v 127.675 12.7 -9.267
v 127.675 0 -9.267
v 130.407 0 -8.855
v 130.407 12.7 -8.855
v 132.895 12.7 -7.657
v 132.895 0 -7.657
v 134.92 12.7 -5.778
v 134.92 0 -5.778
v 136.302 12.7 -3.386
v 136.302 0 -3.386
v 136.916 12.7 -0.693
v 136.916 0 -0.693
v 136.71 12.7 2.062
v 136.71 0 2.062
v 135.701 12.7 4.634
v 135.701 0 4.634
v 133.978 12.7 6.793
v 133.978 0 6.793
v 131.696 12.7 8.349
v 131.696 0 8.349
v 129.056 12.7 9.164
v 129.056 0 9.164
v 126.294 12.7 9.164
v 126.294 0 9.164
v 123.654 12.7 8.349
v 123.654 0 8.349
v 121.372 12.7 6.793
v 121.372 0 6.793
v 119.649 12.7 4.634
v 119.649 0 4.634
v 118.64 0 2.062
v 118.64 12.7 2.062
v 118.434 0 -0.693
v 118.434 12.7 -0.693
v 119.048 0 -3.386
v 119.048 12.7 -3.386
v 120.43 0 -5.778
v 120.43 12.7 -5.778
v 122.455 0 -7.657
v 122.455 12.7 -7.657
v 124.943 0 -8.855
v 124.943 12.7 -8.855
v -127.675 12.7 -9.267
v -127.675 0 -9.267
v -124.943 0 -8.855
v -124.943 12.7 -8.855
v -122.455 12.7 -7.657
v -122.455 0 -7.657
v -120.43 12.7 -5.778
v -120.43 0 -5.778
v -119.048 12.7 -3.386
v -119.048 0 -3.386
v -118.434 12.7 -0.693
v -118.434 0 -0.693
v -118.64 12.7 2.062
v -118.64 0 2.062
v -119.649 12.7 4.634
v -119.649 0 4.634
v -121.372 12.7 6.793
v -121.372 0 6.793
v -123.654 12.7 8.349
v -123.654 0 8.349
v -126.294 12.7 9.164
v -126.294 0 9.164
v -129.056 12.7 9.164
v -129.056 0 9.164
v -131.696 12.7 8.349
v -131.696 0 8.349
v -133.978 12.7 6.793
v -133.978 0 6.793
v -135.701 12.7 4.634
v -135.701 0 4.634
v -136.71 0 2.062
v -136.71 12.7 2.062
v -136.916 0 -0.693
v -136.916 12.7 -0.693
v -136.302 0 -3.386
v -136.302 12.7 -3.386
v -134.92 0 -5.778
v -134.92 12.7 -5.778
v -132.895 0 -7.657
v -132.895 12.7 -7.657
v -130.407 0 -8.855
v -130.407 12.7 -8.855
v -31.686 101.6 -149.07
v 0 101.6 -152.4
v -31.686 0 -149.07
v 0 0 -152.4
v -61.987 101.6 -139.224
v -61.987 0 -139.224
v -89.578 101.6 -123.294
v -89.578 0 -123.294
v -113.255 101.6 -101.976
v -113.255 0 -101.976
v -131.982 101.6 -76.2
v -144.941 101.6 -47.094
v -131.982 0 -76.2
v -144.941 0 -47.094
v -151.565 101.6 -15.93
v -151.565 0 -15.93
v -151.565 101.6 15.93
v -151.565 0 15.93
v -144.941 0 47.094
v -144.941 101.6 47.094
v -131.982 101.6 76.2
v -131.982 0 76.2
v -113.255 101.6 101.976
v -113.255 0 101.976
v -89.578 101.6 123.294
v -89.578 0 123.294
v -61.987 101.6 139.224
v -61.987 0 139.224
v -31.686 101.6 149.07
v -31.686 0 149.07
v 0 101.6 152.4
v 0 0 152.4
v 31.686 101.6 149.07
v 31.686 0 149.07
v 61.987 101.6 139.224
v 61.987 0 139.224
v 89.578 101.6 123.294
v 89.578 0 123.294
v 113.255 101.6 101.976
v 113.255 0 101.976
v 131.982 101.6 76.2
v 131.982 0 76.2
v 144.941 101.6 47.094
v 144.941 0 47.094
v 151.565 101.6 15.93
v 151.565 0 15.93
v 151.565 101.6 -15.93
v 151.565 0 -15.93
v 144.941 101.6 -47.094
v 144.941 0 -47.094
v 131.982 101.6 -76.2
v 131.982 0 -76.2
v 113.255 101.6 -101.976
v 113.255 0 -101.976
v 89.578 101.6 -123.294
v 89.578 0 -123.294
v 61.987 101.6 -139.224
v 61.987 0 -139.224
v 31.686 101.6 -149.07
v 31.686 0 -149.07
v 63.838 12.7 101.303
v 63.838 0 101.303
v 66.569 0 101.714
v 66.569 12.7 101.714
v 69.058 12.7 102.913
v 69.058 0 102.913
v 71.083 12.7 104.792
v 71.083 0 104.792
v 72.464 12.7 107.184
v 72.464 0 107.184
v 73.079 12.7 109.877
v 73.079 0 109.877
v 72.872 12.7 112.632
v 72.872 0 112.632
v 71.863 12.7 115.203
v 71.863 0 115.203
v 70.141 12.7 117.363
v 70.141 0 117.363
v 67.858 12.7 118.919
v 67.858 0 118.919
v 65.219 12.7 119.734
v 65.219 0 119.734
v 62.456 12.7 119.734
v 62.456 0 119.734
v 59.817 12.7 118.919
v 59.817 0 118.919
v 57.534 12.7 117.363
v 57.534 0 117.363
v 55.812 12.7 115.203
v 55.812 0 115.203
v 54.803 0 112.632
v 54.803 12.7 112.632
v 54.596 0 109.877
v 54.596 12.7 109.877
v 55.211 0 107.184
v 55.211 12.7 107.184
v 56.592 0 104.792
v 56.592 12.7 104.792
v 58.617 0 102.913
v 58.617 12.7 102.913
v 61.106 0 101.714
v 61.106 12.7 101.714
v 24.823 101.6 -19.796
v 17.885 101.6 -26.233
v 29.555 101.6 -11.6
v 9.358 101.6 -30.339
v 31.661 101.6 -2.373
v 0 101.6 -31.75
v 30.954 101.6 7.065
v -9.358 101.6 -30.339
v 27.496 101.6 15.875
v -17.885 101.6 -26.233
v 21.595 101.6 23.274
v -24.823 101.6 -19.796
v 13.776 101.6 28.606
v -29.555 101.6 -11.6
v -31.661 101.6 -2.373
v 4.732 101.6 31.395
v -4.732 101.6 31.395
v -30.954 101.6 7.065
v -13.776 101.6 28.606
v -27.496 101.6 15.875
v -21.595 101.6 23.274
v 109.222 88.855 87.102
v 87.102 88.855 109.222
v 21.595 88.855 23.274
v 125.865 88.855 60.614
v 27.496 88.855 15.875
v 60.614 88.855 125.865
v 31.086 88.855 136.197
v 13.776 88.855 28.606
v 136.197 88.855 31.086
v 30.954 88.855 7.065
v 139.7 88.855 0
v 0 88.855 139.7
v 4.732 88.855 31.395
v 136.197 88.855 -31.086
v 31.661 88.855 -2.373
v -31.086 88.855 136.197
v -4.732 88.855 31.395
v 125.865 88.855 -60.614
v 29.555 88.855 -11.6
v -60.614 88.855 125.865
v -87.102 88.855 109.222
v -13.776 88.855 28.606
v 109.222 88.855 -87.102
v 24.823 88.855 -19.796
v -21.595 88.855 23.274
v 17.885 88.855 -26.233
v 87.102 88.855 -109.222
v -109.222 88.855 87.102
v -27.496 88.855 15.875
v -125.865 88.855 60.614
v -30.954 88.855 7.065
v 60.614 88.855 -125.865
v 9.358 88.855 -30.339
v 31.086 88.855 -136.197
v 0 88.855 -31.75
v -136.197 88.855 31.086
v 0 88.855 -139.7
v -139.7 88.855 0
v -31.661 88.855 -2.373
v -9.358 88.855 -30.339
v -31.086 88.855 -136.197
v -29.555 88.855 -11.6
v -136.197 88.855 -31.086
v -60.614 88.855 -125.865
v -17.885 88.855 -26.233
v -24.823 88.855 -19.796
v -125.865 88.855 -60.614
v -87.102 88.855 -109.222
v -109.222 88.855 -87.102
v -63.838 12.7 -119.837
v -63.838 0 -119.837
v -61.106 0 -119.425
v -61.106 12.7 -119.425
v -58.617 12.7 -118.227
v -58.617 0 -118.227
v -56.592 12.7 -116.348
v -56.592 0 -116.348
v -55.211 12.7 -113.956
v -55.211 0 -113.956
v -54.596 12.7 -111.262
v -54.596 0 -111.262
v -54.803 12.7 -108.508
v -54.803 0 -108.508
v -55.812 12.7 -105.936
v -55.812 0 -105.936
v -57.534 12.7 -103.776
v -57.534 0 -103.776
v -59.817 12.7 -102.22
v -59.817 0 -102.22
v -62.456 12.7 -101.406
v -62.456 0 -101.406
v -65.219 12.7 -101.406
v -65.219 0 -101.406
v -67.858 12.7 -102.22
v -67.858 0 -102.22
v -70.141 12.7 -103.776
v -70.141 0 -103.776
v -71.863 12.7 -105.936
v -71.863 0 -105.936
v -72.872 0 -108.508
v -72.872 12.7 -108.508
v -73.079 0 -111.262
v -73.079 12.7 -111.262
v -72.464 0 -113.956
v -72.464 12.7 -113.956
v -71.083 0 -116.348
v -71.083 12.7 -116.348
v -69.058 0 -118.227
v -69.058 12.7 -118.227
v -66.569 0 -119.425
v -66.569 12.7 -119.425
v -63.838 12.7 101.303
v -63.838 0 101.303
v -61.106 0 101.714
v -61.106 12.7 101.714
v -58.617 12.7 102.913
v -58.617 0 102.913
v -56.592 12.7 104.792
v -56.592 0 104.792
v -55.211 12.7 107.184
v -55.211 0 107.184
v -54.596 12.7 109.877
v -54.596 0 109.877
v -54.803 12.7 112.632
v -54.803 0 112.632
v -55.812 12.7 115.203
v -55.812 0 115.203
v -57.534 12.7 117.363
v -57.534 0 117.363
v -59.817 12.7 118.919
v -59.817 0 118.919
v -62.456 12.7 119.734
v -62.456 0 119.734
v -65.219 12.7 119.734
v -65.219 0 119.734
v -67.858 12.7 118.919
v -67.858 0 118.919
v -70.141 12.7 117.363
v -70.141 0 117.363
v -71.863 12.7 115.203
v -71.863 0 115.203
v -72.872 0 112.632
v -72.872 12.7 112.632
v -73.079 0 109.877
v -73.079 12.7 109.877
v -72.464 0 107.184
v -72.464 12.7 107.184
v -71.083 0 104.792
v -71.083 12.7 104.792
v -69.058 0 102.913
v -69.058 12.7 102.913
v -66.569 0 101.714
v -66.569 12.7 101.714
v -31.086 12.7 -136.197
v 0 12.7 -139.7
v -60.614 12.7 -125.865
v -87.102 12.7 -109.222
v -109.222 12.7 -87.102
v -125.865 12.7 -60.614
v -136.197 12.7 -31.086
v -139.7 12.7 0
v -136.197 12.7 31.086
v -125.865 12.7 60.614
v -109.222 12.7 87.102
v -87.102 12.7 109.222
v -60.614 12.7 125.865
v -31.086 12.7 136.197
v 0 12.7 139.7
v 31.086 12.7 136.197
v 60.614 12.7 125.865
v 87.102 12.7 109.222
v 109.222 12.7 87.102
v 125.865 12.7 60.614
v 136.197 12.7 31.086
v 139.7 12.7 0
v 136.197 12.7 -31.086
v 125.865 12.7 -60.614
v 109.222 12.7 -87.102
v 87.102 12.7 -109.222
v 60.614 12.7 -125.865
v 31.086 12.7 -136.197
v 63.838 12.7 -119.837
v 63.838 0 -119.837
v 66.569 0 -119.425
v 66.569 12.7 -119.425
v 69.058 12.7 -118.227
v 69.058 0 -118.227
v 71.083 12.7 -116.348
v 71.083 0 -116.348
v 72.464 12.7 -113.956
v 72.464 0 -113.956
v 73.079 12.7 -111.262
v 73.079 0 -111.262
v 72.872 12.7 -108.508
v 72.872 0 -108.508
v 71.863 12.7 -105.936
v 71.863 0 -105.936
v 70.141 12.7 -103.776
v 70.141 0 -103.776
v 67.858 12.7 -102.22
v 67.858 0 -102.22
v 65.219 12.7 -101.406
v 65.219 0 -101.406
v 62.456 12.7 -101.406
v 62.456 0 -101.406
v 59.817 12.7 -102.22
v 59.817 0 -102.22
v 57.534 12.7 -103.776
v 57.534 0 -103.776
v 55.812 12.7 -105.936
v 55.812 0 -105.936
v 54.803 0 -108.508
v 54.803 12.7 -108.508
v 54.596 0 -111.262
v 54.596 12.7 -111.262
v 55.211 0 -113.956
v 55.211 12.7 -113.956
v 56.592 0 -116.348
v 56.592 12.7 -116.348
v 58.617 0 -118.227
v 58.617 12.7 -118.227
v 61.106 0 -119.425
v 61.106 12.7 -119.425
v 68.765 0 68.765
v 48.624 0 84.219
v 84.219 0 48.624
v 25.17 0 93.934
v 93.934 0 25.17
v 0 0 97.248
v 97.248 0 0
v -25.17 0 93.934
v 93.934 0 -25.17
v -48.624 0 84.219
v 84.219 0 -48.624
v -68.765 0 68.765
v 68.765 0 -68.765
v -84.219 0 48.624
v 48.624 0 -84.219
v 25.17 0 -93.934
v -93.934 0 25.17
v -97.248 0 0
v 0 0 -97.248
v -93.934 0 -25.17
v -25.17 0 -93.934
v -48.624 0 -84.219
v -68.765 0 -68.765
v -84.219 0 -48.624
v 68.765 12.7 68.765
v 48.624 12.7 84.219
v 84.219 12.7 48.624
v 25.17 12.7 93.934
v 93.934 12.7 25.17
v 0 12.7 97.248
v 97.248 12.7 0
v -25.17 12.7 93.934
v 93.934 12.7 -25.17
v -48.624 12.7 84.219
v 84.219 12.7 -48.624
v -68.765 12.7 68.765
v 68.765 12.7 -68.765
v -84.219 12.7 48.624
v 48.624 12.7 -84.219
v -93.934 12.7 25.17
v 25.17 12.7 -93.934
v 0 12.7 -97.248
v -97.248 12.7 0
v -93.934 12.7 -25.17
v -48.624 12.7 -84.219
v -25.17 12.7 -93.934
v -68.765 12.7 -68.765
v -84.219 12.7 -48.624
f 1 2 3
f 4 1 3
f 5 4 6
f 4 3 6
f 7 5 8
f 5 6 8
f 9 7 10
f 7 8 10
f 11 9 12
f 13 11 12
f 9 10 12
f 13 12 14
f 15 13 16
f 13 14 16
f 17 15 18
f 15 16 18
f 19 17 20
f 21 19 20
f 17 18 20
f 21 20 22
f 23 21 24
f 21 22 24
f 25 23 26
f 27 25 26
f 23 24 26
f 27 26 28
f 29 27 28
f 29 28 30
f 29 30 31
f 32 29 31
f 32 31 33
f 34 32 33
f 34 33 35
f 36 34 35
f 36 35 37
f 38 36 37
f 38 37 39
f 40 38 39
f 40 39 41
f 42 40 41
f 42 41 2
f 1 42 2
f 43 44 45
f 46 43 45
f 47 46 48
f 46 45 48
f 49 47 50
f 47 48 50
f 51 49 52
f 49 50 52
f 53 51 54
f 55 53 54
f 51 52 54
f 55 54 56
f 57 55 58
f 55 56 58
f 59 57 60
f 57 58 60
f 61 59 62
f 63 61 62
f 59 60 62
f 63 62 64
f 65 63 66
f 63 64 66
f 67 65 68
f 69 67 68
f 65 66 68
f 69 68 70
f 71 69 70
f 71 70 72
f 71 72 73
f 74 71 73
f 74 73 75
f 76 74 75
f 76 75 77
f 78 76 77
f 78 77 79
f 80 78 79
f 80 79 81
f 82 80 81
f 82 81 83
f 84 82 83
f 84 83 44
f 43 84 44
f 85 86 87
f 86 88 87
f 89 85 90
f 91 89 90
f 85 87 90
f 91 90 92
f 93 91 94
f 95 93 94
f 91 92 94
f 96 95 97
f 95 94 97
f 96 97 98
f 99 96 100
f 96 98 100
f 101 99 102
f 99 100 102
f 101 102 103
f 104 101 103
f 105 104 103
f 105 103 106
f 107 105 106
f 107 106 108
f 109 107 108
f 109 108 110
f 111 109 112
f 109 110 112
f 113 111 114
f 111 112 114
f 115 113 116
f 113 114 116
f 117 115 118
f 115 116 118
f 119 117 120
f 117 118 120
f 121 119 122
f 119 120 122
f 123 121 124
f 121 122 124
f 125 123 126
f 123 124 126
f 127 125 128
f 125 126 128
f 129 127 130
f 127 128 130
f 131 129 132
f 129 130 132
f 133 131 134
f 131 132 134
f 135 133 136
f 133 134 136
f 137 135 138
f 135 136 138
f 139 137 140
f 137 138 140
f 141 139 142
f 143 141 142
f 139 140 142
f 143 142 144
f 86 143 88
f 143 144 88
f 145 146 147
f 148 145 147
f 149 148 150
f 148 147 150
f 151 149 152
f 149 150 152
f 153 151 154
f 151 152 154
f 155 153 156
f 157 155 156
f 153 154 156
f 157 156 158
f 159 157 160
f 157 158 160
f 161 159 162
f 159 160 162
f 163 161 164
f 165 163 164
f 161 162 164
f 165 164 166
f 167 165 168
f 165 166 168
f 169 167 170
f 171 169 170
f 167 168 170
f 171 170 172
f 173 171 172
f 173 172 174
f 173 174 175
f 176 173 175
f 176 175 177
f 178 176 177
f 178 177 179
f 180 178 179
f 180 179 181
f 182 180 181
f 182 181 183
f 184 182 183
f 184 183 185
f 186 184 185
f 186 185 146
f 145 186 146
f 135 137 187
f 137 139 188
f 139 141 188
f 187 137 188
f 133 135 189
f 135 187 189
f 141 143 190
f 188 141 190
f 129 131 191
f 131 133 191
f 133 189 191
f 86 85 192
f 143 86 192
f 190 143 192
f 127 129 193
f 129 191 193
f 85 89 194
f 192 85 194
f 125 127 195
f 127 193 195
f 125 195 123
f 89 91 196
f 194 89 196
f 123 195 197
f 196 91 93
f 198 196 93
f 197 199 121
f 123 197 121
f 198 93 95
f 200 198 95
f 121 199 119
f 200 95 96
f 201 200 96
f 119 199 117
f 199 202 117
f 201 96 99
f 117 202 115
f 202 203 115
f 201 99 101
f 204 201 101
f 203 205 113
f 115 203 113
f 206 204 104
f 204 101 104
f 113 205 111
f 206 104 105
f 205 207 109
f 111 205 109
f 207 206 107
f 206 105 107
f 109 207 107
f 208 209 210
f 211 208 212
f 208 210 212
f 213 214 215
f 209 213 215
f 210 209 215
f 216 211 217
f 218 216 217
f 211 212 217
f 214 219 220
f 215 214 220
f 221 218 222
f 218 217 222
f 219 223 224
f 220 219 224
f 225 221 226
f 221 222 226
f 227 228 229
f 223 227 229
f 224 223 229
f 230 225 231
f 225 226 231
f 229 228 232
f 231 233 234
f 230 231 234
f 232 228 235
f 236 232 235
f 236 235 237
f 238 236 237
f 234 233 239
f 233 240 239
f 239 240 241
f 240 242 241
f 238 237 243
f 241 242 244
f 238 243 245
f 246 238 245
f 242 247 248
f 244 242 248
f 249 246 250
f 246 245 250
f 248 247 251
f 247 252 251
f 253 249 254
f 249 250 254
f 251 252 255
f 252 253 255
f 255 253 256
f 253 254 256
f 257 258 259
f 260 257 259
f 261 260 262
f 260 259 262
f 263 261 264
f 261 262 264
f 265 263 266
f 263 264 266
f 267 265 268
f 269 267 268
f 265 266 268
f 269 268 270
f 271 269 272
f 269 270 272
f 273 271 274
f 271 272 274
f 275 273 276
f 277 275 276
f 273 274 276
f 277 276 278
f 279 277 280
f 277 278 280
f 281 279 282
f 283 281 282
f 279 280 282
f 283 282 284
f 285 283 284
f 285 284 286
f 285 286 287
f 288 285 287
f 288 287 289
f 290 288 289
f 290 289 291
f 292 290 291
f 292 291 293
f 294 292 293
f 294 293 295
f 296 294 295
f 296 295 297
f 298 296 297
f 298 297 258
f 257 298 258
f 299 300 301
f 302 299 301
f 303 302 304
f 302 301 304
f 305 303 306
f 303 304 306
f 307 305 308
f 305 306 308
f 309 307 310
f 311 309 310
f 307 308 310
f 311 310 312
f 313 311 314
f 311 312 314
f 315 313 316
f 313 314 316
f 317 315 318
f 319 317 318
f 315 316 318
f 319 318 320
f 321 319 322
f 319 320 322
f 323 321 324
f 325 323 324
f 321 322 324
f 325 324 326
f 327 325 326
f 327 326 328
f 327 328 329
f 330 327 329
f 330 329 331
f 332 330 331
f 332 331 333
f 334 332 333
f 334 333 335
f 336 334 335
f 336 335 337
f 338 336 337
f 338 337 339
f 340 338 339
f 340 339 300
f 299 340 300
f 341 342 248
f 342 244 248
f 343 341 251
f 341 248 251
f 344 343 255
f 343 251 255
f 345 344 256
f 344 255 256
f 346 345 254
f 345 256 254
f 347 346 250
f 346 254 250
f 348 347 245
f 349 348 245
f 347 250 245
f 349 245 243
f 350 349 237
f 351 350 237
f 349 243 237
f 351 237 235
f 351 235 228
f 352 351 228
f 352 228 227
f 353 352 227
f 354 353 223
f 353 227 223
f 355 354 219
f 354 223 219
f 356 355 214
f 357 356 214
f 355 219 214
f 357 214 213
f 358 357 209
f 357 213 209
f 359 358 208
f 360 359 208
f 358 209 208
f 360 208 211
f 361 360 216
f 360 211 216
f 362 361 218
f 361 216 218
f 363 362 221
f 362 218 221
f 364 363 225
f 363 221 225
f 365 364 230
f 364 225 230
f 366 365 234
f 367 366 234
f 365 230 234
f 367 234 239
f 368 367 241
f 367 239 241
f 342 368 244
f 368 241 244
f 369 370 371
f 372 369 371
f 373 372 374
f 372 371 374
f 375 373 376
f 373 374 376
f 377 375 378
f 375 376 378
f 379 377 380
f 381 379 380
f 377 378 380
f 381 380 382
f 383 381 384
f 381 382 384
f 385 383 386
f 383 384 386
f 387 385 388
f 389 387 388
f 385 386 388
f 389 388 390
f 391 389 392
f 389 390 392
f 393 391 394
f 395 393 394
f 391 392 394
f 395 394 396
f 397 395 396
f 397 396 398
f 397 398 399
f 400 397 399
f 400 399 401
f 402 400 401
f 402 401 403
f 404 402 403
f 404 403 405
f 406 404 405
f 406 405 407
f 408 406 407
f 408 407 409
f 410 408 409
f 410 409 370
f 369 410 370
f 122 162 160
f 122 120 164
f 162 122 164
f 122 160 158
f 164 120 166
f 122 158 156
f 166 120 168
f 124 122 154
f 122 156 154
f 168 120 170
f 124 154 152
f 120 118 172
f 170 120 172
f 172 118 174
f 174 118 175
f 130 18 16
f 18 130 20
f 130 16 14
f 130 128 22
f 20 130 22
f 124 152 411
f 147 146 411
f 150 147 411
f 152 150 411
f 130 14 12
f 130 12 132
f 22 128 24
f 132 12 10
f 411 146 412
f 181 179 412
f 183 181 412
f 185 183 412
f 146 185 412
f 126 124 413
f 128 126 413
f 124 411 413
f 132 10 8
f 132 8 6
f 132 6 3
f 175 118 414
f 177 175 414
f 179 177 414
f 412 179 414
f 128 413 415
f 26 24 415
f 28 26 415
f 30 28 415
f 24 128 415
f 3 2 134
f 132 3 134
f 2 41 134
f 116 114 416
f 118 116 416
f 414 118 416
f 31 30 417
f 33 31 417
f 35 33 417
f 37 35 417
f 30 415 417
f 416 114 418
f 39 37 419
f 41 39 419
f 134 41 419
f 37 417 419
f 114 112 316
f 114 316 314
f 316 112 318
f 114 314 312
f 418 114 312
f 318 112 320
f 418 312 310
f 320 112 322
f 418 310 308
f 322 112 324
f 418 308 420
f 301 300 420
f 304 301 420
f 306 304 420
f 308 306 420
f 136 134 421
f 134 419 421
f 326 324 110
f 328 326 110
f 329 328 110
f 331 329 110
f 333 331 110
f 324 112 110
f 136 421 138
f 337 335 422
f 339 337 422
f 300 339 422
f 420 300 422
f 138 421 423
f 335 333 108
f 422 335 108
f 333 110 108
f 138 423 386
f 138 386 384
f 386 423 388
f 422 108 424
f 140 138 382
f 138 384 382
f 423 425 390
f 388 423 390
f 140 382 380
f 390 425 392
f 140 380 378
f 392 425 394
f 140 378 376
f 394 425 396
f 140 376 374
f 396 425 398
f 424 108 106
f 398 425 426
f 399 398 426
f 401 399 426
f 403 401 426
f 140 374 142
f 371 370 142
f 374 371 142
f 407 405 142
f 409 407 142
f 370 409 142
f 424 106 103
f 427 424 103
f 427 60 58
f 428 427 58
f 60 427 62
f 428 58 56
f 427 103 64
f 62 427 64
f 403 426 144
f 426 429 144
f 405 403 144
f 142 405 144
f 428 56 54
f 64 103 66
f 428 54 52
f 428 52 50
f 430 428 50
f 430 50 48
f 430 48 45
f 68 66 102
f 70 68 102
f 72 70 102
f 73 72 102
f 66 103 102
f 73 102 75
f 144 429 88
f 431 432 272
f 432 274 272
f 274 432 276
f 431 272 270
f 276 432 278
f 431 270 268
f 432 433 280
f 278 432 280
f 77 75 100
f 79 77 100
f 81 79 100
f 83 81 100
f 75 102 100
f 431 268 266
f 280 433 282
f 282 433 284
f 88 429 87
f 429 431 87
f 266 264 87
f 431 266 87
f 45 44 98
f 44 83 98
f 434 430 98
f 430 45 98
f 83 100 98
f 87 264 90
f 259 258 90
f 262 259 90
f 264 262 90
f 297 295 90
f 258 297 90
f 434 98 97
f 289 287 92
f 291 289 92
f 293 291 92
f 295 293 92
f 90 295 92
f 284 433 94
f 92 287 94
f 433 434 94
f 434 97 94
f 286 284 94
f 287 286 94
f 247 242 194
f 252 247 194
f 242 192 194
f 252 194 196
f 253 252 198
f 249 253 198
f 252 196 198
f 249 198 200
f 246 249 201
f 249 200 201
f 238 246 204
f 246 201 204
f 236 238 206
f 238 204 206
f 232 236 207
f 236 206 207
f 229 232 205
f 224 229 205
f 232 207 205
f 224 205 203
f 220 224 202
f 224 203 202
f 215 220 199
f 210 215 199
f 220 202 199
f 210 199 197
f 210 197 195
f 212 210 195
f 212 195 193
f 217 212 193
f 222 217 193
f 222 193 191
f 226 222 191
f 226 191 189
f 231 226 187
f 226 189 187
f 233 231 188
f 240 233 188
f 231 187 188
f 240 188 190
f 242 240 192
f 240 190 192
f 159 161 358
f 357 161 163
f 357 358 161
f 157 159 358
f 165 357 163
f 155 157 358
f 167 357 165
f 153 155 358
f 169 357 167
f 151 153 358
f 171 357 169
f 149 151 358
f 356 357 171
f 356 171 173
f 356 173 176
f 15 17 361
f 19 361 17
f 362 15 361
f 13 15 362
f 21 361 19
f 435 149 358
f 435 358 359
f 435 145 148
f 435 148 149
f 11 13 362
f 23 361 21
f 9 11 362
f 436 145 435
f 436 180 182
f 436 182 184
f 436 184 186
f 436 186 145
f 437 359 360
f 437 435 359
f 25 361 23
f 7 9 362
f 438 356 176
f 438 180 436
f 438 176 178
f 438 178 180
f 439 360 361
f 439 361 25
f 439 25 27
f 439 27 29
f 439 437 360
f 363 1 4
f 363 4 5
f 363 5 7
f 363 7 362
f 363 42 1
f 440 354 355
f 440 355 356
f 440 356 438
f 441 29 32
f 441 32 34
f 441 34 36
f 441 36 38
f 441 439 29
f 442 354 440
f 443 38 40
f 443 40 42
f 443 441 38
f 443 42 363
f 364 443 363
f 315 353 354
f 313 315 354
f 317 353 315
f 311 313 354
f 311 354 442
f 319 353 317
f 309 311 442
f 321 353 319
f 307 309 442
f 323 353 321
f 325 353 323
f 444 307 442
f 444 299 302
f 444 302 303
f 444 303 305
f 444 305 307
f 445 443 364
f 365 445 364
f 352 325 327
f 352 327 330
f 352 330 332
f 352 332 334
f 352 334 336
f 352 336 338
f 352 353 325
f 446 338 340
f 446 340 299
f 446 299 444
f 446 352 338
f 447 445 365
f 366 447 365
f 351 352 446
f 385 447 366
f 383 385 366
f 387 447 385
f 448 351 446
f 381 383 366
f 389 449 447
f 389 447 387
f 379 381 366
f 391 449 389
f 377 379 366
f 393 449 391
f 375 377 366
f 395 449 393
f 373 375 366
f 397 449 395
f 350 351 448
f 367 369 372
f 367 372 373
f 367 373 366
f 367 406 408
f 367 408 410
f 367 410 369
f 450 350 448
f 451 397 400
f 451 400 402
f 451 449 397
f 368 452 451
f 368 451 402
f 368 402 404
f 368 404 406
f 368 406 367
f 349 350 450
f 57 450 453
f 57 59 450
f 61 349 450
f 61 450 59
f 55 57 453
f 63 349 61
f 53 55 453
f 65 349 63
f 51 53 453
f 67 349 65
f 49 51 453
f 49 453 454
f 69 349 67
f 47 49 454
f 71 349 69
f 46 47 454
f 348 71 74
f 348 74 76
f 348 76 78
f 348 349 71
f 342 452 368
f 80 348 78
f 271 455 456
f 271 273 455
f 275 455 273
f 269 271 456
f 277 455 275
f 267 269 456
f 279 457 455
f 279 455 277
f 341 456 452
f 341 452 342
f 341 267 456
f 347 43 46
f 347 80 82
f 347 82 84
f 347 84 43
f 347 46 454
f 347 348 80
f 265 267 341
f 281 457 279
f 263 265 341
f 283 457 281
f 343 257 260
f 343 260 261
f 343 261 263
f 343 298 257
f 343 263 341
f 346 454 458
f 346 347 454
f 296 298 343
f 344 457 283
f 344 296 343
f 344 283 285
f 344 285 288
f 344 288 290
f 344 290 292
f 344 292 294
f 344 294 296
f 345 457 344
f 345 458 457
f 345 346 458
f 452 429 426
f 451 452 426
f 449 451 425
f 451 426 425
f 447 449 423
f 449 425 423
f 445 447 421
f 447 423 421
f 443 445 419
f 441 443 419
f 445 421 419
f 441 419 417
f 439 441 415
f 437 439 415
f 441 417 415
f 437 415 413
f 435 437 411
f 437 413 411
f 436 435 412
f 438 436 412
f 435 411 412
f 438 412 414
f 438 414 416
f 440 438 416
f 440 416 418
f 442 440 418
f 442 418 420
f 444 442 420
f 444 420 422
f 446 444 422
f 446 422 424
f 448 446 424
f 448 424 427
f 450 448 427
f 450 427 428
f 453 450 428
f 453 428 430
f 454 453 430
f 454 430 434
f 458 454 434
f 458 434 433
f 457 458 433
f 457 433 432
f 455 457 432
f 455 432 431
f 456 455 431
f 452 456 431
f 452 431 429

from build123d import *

# Parameters (mm, degrees)
SKETCH1_W          = 139.7
SKETCH1_H          = 12.7
SKETCH1_W_2        = 107.95
SKETCH1_H_2        = 12.744604202
CUT_EXTRUDE3_REACH = 240.273
SKETCH5_R          = 97.248113747
SKETCH5_R_2        = 9.267203016


with BuildPart() as part:
    # Sketch1 → Revolve1 (revolve)
    with BuildSketch(Plane.XY, mode=Mode.PRIVATE) as revolve1_sk:
        Polygon((-152.4, 0), (-139.7, 0), (-139.7, 12.7), (-139.7, 88.855395798), (-139.7, 101.6), (-152.4, 101.6), align=None)
        with Locations((-69.85, 6.35)):
            Rectangle(SKETCH1_W, SKETCH1_H)
        with Locations((-85.725, 95.227697899)):
            Rectangle(SKETCH1_W_2, SKETCH1_H_2)
    revolve(revolve1_sk.sketch.rotate(Axis((0, 50.8, 0), (0, 1, 0)), 270), axis=Axis((0, 50.8, 0), (0, 1, 0)))

    # Sketch5 → Cut-Extrude3 (cut, up to next)
    with BuildSketch(Plane.XZ, mode=Mode.PRIVATE) as cut_extrude3_sk1:
        with Locations(Location((0, 0, 0), (0, 0, 270))):
            Circle(SKETCH5_R)
    cut_extrude3_tool1 = extrude(cut_extrude3_sk1.sketch, amount=-CUT_EXTRUDE3_REACH, mode=Mode.PRIVATE) & part.part
    # Sketch5 → Cut-Extrude3 (cut, up to next)
    with BuildSketch(Plane.XZ, mode=Mode.PRIVATE) as cut_extrude3_sk2:
        with Locations(Location((127.67505098, 0, 0), (0, 0, 270))):
            Circle(SKETCH5_R_2)
    cut_extrude3_tool2 = extrude(cut_extrude3_sk2.sketch, amount=-CUT_EXTRUDE3_REACH, mode=Mode.PRIVATE) & part.part
    # Sketch5 → Cut-Extrude3 (cut, up to next)
    with BuildSketch(Plane.XZ, mode=Mode.PRIVATE) as cut_extrude3_sk3:
        with Locations(Location((63.83752549, -110.569837578, 0), (0, 0, 270))):
            Circle(SKETCH5_R_2)
    cut_extrude3_tool3 = extrude(cut_extrude3_sk3.sketch, amount=-CUT_EXTRUDE3_REACH, mode=Mode.PRIVATE) & part.part
    # Sketch5 → Cut-Extrude3 (cut, up to next)
    with BuildSketch(Plane.XZ, mode=Mode.PRIVATE) as cut_extrude3_sk4:
        with Locations(Location((-63.83752549, -110.569837578, 0), (0, 0, 270))):
            Circle(SKETCH5_R_2)
    cut_extrude3_tool4 = extrude(cut_extrude3_sk4.sketch, amount=-CUT_EXTRUDE3_REACH, mode=Mode.PRIVATE) & part.part
    # Sketch5 → Cut-Extrude3 (cut, up to next)
    with BuildSketch(Plane.XZ, mode=Mode.PRIVATE) as cut_extrude3_sk5:
        with Locations(Location((-127.67505098, 0, 0), (0, 0, 270))):
            Circle(SKETCH5_R_2)
    cut_extrude3_tool5 = extrude(cut_extrude3_sk5.sketch, amount=-CUT_EXTRUDE3_REACH, mode=Mode.PRIVATE) & part.part
    # Sketch5 → Cut-Extrude3 (cut, up to next)
    with BuildSketch(Plane.XZ, mode=Mode.PRIVATE) as cut_extrude3_sk6:
        with Locations(Location((-63.83752549, 110.569837578, 0), (0, 0, 270))):
            Circle(SKETCH5_R_2)
    cut_extrude3_tool6 = extrude(cut_extrude3_sk6.sketch, amount=-CUT_EXTRUDE3_REACH, mode=Mode.PRIVATE) & part.part
    # Sketch5 → Cut-Extrude3 (cut, up to next)
    with BuildSketch(Plane.XZ, mode=Mode.PRIVATE) as cut_extrude3_sk7:
        with Locations(Location((63.83752549, 110.569837578, 0), (0, 0, 270))):
            Circle(SKETCH5_R_2)
    cut_extrude3_tool7 = extrude(cut_extrude3_sk7.sketch, amount=-CUT_EXTRUDE3_REACH, mode=Mode.PRIVATE) & part.part
    add(cut_extrude3_tool1.solids().sort_by_distance((0, 0, 0))[0], mode=Mode.SUBTRACT)
    add(cut_extrude3_tool2.solids().sort_by_distance((127.675051, 0, 0))[0], mode=Mode.SUBTRACT)
    add(cut_extrude3_tool3.solids().sort_by_distance((63.837525, 0, -110.569838))[0], mode=Mode.SUBTRACT)
    add(cut_extrude3_tool4.solids().sort_by_distance((-63.837525, 0, -110.569838))[0], mode=Mode.SUBTRACT)
    add(cut_extrude3_tool5.solids().sort_by_distance((-127.675051, 0, 0))[0], mode=Mode.SUBTRACT)
    add(cut_extrude3_tool6.solids().sort_by_distance((-63.837525, 0, 110.569838))[0], mode=Mode.SUBTRACT)
    add(cut_extrude3_tool7.solids().sort_by_distance((63.837525, 0, 110.569838))[0], mode=Mode.SUBTRACT)


solid = part.part
